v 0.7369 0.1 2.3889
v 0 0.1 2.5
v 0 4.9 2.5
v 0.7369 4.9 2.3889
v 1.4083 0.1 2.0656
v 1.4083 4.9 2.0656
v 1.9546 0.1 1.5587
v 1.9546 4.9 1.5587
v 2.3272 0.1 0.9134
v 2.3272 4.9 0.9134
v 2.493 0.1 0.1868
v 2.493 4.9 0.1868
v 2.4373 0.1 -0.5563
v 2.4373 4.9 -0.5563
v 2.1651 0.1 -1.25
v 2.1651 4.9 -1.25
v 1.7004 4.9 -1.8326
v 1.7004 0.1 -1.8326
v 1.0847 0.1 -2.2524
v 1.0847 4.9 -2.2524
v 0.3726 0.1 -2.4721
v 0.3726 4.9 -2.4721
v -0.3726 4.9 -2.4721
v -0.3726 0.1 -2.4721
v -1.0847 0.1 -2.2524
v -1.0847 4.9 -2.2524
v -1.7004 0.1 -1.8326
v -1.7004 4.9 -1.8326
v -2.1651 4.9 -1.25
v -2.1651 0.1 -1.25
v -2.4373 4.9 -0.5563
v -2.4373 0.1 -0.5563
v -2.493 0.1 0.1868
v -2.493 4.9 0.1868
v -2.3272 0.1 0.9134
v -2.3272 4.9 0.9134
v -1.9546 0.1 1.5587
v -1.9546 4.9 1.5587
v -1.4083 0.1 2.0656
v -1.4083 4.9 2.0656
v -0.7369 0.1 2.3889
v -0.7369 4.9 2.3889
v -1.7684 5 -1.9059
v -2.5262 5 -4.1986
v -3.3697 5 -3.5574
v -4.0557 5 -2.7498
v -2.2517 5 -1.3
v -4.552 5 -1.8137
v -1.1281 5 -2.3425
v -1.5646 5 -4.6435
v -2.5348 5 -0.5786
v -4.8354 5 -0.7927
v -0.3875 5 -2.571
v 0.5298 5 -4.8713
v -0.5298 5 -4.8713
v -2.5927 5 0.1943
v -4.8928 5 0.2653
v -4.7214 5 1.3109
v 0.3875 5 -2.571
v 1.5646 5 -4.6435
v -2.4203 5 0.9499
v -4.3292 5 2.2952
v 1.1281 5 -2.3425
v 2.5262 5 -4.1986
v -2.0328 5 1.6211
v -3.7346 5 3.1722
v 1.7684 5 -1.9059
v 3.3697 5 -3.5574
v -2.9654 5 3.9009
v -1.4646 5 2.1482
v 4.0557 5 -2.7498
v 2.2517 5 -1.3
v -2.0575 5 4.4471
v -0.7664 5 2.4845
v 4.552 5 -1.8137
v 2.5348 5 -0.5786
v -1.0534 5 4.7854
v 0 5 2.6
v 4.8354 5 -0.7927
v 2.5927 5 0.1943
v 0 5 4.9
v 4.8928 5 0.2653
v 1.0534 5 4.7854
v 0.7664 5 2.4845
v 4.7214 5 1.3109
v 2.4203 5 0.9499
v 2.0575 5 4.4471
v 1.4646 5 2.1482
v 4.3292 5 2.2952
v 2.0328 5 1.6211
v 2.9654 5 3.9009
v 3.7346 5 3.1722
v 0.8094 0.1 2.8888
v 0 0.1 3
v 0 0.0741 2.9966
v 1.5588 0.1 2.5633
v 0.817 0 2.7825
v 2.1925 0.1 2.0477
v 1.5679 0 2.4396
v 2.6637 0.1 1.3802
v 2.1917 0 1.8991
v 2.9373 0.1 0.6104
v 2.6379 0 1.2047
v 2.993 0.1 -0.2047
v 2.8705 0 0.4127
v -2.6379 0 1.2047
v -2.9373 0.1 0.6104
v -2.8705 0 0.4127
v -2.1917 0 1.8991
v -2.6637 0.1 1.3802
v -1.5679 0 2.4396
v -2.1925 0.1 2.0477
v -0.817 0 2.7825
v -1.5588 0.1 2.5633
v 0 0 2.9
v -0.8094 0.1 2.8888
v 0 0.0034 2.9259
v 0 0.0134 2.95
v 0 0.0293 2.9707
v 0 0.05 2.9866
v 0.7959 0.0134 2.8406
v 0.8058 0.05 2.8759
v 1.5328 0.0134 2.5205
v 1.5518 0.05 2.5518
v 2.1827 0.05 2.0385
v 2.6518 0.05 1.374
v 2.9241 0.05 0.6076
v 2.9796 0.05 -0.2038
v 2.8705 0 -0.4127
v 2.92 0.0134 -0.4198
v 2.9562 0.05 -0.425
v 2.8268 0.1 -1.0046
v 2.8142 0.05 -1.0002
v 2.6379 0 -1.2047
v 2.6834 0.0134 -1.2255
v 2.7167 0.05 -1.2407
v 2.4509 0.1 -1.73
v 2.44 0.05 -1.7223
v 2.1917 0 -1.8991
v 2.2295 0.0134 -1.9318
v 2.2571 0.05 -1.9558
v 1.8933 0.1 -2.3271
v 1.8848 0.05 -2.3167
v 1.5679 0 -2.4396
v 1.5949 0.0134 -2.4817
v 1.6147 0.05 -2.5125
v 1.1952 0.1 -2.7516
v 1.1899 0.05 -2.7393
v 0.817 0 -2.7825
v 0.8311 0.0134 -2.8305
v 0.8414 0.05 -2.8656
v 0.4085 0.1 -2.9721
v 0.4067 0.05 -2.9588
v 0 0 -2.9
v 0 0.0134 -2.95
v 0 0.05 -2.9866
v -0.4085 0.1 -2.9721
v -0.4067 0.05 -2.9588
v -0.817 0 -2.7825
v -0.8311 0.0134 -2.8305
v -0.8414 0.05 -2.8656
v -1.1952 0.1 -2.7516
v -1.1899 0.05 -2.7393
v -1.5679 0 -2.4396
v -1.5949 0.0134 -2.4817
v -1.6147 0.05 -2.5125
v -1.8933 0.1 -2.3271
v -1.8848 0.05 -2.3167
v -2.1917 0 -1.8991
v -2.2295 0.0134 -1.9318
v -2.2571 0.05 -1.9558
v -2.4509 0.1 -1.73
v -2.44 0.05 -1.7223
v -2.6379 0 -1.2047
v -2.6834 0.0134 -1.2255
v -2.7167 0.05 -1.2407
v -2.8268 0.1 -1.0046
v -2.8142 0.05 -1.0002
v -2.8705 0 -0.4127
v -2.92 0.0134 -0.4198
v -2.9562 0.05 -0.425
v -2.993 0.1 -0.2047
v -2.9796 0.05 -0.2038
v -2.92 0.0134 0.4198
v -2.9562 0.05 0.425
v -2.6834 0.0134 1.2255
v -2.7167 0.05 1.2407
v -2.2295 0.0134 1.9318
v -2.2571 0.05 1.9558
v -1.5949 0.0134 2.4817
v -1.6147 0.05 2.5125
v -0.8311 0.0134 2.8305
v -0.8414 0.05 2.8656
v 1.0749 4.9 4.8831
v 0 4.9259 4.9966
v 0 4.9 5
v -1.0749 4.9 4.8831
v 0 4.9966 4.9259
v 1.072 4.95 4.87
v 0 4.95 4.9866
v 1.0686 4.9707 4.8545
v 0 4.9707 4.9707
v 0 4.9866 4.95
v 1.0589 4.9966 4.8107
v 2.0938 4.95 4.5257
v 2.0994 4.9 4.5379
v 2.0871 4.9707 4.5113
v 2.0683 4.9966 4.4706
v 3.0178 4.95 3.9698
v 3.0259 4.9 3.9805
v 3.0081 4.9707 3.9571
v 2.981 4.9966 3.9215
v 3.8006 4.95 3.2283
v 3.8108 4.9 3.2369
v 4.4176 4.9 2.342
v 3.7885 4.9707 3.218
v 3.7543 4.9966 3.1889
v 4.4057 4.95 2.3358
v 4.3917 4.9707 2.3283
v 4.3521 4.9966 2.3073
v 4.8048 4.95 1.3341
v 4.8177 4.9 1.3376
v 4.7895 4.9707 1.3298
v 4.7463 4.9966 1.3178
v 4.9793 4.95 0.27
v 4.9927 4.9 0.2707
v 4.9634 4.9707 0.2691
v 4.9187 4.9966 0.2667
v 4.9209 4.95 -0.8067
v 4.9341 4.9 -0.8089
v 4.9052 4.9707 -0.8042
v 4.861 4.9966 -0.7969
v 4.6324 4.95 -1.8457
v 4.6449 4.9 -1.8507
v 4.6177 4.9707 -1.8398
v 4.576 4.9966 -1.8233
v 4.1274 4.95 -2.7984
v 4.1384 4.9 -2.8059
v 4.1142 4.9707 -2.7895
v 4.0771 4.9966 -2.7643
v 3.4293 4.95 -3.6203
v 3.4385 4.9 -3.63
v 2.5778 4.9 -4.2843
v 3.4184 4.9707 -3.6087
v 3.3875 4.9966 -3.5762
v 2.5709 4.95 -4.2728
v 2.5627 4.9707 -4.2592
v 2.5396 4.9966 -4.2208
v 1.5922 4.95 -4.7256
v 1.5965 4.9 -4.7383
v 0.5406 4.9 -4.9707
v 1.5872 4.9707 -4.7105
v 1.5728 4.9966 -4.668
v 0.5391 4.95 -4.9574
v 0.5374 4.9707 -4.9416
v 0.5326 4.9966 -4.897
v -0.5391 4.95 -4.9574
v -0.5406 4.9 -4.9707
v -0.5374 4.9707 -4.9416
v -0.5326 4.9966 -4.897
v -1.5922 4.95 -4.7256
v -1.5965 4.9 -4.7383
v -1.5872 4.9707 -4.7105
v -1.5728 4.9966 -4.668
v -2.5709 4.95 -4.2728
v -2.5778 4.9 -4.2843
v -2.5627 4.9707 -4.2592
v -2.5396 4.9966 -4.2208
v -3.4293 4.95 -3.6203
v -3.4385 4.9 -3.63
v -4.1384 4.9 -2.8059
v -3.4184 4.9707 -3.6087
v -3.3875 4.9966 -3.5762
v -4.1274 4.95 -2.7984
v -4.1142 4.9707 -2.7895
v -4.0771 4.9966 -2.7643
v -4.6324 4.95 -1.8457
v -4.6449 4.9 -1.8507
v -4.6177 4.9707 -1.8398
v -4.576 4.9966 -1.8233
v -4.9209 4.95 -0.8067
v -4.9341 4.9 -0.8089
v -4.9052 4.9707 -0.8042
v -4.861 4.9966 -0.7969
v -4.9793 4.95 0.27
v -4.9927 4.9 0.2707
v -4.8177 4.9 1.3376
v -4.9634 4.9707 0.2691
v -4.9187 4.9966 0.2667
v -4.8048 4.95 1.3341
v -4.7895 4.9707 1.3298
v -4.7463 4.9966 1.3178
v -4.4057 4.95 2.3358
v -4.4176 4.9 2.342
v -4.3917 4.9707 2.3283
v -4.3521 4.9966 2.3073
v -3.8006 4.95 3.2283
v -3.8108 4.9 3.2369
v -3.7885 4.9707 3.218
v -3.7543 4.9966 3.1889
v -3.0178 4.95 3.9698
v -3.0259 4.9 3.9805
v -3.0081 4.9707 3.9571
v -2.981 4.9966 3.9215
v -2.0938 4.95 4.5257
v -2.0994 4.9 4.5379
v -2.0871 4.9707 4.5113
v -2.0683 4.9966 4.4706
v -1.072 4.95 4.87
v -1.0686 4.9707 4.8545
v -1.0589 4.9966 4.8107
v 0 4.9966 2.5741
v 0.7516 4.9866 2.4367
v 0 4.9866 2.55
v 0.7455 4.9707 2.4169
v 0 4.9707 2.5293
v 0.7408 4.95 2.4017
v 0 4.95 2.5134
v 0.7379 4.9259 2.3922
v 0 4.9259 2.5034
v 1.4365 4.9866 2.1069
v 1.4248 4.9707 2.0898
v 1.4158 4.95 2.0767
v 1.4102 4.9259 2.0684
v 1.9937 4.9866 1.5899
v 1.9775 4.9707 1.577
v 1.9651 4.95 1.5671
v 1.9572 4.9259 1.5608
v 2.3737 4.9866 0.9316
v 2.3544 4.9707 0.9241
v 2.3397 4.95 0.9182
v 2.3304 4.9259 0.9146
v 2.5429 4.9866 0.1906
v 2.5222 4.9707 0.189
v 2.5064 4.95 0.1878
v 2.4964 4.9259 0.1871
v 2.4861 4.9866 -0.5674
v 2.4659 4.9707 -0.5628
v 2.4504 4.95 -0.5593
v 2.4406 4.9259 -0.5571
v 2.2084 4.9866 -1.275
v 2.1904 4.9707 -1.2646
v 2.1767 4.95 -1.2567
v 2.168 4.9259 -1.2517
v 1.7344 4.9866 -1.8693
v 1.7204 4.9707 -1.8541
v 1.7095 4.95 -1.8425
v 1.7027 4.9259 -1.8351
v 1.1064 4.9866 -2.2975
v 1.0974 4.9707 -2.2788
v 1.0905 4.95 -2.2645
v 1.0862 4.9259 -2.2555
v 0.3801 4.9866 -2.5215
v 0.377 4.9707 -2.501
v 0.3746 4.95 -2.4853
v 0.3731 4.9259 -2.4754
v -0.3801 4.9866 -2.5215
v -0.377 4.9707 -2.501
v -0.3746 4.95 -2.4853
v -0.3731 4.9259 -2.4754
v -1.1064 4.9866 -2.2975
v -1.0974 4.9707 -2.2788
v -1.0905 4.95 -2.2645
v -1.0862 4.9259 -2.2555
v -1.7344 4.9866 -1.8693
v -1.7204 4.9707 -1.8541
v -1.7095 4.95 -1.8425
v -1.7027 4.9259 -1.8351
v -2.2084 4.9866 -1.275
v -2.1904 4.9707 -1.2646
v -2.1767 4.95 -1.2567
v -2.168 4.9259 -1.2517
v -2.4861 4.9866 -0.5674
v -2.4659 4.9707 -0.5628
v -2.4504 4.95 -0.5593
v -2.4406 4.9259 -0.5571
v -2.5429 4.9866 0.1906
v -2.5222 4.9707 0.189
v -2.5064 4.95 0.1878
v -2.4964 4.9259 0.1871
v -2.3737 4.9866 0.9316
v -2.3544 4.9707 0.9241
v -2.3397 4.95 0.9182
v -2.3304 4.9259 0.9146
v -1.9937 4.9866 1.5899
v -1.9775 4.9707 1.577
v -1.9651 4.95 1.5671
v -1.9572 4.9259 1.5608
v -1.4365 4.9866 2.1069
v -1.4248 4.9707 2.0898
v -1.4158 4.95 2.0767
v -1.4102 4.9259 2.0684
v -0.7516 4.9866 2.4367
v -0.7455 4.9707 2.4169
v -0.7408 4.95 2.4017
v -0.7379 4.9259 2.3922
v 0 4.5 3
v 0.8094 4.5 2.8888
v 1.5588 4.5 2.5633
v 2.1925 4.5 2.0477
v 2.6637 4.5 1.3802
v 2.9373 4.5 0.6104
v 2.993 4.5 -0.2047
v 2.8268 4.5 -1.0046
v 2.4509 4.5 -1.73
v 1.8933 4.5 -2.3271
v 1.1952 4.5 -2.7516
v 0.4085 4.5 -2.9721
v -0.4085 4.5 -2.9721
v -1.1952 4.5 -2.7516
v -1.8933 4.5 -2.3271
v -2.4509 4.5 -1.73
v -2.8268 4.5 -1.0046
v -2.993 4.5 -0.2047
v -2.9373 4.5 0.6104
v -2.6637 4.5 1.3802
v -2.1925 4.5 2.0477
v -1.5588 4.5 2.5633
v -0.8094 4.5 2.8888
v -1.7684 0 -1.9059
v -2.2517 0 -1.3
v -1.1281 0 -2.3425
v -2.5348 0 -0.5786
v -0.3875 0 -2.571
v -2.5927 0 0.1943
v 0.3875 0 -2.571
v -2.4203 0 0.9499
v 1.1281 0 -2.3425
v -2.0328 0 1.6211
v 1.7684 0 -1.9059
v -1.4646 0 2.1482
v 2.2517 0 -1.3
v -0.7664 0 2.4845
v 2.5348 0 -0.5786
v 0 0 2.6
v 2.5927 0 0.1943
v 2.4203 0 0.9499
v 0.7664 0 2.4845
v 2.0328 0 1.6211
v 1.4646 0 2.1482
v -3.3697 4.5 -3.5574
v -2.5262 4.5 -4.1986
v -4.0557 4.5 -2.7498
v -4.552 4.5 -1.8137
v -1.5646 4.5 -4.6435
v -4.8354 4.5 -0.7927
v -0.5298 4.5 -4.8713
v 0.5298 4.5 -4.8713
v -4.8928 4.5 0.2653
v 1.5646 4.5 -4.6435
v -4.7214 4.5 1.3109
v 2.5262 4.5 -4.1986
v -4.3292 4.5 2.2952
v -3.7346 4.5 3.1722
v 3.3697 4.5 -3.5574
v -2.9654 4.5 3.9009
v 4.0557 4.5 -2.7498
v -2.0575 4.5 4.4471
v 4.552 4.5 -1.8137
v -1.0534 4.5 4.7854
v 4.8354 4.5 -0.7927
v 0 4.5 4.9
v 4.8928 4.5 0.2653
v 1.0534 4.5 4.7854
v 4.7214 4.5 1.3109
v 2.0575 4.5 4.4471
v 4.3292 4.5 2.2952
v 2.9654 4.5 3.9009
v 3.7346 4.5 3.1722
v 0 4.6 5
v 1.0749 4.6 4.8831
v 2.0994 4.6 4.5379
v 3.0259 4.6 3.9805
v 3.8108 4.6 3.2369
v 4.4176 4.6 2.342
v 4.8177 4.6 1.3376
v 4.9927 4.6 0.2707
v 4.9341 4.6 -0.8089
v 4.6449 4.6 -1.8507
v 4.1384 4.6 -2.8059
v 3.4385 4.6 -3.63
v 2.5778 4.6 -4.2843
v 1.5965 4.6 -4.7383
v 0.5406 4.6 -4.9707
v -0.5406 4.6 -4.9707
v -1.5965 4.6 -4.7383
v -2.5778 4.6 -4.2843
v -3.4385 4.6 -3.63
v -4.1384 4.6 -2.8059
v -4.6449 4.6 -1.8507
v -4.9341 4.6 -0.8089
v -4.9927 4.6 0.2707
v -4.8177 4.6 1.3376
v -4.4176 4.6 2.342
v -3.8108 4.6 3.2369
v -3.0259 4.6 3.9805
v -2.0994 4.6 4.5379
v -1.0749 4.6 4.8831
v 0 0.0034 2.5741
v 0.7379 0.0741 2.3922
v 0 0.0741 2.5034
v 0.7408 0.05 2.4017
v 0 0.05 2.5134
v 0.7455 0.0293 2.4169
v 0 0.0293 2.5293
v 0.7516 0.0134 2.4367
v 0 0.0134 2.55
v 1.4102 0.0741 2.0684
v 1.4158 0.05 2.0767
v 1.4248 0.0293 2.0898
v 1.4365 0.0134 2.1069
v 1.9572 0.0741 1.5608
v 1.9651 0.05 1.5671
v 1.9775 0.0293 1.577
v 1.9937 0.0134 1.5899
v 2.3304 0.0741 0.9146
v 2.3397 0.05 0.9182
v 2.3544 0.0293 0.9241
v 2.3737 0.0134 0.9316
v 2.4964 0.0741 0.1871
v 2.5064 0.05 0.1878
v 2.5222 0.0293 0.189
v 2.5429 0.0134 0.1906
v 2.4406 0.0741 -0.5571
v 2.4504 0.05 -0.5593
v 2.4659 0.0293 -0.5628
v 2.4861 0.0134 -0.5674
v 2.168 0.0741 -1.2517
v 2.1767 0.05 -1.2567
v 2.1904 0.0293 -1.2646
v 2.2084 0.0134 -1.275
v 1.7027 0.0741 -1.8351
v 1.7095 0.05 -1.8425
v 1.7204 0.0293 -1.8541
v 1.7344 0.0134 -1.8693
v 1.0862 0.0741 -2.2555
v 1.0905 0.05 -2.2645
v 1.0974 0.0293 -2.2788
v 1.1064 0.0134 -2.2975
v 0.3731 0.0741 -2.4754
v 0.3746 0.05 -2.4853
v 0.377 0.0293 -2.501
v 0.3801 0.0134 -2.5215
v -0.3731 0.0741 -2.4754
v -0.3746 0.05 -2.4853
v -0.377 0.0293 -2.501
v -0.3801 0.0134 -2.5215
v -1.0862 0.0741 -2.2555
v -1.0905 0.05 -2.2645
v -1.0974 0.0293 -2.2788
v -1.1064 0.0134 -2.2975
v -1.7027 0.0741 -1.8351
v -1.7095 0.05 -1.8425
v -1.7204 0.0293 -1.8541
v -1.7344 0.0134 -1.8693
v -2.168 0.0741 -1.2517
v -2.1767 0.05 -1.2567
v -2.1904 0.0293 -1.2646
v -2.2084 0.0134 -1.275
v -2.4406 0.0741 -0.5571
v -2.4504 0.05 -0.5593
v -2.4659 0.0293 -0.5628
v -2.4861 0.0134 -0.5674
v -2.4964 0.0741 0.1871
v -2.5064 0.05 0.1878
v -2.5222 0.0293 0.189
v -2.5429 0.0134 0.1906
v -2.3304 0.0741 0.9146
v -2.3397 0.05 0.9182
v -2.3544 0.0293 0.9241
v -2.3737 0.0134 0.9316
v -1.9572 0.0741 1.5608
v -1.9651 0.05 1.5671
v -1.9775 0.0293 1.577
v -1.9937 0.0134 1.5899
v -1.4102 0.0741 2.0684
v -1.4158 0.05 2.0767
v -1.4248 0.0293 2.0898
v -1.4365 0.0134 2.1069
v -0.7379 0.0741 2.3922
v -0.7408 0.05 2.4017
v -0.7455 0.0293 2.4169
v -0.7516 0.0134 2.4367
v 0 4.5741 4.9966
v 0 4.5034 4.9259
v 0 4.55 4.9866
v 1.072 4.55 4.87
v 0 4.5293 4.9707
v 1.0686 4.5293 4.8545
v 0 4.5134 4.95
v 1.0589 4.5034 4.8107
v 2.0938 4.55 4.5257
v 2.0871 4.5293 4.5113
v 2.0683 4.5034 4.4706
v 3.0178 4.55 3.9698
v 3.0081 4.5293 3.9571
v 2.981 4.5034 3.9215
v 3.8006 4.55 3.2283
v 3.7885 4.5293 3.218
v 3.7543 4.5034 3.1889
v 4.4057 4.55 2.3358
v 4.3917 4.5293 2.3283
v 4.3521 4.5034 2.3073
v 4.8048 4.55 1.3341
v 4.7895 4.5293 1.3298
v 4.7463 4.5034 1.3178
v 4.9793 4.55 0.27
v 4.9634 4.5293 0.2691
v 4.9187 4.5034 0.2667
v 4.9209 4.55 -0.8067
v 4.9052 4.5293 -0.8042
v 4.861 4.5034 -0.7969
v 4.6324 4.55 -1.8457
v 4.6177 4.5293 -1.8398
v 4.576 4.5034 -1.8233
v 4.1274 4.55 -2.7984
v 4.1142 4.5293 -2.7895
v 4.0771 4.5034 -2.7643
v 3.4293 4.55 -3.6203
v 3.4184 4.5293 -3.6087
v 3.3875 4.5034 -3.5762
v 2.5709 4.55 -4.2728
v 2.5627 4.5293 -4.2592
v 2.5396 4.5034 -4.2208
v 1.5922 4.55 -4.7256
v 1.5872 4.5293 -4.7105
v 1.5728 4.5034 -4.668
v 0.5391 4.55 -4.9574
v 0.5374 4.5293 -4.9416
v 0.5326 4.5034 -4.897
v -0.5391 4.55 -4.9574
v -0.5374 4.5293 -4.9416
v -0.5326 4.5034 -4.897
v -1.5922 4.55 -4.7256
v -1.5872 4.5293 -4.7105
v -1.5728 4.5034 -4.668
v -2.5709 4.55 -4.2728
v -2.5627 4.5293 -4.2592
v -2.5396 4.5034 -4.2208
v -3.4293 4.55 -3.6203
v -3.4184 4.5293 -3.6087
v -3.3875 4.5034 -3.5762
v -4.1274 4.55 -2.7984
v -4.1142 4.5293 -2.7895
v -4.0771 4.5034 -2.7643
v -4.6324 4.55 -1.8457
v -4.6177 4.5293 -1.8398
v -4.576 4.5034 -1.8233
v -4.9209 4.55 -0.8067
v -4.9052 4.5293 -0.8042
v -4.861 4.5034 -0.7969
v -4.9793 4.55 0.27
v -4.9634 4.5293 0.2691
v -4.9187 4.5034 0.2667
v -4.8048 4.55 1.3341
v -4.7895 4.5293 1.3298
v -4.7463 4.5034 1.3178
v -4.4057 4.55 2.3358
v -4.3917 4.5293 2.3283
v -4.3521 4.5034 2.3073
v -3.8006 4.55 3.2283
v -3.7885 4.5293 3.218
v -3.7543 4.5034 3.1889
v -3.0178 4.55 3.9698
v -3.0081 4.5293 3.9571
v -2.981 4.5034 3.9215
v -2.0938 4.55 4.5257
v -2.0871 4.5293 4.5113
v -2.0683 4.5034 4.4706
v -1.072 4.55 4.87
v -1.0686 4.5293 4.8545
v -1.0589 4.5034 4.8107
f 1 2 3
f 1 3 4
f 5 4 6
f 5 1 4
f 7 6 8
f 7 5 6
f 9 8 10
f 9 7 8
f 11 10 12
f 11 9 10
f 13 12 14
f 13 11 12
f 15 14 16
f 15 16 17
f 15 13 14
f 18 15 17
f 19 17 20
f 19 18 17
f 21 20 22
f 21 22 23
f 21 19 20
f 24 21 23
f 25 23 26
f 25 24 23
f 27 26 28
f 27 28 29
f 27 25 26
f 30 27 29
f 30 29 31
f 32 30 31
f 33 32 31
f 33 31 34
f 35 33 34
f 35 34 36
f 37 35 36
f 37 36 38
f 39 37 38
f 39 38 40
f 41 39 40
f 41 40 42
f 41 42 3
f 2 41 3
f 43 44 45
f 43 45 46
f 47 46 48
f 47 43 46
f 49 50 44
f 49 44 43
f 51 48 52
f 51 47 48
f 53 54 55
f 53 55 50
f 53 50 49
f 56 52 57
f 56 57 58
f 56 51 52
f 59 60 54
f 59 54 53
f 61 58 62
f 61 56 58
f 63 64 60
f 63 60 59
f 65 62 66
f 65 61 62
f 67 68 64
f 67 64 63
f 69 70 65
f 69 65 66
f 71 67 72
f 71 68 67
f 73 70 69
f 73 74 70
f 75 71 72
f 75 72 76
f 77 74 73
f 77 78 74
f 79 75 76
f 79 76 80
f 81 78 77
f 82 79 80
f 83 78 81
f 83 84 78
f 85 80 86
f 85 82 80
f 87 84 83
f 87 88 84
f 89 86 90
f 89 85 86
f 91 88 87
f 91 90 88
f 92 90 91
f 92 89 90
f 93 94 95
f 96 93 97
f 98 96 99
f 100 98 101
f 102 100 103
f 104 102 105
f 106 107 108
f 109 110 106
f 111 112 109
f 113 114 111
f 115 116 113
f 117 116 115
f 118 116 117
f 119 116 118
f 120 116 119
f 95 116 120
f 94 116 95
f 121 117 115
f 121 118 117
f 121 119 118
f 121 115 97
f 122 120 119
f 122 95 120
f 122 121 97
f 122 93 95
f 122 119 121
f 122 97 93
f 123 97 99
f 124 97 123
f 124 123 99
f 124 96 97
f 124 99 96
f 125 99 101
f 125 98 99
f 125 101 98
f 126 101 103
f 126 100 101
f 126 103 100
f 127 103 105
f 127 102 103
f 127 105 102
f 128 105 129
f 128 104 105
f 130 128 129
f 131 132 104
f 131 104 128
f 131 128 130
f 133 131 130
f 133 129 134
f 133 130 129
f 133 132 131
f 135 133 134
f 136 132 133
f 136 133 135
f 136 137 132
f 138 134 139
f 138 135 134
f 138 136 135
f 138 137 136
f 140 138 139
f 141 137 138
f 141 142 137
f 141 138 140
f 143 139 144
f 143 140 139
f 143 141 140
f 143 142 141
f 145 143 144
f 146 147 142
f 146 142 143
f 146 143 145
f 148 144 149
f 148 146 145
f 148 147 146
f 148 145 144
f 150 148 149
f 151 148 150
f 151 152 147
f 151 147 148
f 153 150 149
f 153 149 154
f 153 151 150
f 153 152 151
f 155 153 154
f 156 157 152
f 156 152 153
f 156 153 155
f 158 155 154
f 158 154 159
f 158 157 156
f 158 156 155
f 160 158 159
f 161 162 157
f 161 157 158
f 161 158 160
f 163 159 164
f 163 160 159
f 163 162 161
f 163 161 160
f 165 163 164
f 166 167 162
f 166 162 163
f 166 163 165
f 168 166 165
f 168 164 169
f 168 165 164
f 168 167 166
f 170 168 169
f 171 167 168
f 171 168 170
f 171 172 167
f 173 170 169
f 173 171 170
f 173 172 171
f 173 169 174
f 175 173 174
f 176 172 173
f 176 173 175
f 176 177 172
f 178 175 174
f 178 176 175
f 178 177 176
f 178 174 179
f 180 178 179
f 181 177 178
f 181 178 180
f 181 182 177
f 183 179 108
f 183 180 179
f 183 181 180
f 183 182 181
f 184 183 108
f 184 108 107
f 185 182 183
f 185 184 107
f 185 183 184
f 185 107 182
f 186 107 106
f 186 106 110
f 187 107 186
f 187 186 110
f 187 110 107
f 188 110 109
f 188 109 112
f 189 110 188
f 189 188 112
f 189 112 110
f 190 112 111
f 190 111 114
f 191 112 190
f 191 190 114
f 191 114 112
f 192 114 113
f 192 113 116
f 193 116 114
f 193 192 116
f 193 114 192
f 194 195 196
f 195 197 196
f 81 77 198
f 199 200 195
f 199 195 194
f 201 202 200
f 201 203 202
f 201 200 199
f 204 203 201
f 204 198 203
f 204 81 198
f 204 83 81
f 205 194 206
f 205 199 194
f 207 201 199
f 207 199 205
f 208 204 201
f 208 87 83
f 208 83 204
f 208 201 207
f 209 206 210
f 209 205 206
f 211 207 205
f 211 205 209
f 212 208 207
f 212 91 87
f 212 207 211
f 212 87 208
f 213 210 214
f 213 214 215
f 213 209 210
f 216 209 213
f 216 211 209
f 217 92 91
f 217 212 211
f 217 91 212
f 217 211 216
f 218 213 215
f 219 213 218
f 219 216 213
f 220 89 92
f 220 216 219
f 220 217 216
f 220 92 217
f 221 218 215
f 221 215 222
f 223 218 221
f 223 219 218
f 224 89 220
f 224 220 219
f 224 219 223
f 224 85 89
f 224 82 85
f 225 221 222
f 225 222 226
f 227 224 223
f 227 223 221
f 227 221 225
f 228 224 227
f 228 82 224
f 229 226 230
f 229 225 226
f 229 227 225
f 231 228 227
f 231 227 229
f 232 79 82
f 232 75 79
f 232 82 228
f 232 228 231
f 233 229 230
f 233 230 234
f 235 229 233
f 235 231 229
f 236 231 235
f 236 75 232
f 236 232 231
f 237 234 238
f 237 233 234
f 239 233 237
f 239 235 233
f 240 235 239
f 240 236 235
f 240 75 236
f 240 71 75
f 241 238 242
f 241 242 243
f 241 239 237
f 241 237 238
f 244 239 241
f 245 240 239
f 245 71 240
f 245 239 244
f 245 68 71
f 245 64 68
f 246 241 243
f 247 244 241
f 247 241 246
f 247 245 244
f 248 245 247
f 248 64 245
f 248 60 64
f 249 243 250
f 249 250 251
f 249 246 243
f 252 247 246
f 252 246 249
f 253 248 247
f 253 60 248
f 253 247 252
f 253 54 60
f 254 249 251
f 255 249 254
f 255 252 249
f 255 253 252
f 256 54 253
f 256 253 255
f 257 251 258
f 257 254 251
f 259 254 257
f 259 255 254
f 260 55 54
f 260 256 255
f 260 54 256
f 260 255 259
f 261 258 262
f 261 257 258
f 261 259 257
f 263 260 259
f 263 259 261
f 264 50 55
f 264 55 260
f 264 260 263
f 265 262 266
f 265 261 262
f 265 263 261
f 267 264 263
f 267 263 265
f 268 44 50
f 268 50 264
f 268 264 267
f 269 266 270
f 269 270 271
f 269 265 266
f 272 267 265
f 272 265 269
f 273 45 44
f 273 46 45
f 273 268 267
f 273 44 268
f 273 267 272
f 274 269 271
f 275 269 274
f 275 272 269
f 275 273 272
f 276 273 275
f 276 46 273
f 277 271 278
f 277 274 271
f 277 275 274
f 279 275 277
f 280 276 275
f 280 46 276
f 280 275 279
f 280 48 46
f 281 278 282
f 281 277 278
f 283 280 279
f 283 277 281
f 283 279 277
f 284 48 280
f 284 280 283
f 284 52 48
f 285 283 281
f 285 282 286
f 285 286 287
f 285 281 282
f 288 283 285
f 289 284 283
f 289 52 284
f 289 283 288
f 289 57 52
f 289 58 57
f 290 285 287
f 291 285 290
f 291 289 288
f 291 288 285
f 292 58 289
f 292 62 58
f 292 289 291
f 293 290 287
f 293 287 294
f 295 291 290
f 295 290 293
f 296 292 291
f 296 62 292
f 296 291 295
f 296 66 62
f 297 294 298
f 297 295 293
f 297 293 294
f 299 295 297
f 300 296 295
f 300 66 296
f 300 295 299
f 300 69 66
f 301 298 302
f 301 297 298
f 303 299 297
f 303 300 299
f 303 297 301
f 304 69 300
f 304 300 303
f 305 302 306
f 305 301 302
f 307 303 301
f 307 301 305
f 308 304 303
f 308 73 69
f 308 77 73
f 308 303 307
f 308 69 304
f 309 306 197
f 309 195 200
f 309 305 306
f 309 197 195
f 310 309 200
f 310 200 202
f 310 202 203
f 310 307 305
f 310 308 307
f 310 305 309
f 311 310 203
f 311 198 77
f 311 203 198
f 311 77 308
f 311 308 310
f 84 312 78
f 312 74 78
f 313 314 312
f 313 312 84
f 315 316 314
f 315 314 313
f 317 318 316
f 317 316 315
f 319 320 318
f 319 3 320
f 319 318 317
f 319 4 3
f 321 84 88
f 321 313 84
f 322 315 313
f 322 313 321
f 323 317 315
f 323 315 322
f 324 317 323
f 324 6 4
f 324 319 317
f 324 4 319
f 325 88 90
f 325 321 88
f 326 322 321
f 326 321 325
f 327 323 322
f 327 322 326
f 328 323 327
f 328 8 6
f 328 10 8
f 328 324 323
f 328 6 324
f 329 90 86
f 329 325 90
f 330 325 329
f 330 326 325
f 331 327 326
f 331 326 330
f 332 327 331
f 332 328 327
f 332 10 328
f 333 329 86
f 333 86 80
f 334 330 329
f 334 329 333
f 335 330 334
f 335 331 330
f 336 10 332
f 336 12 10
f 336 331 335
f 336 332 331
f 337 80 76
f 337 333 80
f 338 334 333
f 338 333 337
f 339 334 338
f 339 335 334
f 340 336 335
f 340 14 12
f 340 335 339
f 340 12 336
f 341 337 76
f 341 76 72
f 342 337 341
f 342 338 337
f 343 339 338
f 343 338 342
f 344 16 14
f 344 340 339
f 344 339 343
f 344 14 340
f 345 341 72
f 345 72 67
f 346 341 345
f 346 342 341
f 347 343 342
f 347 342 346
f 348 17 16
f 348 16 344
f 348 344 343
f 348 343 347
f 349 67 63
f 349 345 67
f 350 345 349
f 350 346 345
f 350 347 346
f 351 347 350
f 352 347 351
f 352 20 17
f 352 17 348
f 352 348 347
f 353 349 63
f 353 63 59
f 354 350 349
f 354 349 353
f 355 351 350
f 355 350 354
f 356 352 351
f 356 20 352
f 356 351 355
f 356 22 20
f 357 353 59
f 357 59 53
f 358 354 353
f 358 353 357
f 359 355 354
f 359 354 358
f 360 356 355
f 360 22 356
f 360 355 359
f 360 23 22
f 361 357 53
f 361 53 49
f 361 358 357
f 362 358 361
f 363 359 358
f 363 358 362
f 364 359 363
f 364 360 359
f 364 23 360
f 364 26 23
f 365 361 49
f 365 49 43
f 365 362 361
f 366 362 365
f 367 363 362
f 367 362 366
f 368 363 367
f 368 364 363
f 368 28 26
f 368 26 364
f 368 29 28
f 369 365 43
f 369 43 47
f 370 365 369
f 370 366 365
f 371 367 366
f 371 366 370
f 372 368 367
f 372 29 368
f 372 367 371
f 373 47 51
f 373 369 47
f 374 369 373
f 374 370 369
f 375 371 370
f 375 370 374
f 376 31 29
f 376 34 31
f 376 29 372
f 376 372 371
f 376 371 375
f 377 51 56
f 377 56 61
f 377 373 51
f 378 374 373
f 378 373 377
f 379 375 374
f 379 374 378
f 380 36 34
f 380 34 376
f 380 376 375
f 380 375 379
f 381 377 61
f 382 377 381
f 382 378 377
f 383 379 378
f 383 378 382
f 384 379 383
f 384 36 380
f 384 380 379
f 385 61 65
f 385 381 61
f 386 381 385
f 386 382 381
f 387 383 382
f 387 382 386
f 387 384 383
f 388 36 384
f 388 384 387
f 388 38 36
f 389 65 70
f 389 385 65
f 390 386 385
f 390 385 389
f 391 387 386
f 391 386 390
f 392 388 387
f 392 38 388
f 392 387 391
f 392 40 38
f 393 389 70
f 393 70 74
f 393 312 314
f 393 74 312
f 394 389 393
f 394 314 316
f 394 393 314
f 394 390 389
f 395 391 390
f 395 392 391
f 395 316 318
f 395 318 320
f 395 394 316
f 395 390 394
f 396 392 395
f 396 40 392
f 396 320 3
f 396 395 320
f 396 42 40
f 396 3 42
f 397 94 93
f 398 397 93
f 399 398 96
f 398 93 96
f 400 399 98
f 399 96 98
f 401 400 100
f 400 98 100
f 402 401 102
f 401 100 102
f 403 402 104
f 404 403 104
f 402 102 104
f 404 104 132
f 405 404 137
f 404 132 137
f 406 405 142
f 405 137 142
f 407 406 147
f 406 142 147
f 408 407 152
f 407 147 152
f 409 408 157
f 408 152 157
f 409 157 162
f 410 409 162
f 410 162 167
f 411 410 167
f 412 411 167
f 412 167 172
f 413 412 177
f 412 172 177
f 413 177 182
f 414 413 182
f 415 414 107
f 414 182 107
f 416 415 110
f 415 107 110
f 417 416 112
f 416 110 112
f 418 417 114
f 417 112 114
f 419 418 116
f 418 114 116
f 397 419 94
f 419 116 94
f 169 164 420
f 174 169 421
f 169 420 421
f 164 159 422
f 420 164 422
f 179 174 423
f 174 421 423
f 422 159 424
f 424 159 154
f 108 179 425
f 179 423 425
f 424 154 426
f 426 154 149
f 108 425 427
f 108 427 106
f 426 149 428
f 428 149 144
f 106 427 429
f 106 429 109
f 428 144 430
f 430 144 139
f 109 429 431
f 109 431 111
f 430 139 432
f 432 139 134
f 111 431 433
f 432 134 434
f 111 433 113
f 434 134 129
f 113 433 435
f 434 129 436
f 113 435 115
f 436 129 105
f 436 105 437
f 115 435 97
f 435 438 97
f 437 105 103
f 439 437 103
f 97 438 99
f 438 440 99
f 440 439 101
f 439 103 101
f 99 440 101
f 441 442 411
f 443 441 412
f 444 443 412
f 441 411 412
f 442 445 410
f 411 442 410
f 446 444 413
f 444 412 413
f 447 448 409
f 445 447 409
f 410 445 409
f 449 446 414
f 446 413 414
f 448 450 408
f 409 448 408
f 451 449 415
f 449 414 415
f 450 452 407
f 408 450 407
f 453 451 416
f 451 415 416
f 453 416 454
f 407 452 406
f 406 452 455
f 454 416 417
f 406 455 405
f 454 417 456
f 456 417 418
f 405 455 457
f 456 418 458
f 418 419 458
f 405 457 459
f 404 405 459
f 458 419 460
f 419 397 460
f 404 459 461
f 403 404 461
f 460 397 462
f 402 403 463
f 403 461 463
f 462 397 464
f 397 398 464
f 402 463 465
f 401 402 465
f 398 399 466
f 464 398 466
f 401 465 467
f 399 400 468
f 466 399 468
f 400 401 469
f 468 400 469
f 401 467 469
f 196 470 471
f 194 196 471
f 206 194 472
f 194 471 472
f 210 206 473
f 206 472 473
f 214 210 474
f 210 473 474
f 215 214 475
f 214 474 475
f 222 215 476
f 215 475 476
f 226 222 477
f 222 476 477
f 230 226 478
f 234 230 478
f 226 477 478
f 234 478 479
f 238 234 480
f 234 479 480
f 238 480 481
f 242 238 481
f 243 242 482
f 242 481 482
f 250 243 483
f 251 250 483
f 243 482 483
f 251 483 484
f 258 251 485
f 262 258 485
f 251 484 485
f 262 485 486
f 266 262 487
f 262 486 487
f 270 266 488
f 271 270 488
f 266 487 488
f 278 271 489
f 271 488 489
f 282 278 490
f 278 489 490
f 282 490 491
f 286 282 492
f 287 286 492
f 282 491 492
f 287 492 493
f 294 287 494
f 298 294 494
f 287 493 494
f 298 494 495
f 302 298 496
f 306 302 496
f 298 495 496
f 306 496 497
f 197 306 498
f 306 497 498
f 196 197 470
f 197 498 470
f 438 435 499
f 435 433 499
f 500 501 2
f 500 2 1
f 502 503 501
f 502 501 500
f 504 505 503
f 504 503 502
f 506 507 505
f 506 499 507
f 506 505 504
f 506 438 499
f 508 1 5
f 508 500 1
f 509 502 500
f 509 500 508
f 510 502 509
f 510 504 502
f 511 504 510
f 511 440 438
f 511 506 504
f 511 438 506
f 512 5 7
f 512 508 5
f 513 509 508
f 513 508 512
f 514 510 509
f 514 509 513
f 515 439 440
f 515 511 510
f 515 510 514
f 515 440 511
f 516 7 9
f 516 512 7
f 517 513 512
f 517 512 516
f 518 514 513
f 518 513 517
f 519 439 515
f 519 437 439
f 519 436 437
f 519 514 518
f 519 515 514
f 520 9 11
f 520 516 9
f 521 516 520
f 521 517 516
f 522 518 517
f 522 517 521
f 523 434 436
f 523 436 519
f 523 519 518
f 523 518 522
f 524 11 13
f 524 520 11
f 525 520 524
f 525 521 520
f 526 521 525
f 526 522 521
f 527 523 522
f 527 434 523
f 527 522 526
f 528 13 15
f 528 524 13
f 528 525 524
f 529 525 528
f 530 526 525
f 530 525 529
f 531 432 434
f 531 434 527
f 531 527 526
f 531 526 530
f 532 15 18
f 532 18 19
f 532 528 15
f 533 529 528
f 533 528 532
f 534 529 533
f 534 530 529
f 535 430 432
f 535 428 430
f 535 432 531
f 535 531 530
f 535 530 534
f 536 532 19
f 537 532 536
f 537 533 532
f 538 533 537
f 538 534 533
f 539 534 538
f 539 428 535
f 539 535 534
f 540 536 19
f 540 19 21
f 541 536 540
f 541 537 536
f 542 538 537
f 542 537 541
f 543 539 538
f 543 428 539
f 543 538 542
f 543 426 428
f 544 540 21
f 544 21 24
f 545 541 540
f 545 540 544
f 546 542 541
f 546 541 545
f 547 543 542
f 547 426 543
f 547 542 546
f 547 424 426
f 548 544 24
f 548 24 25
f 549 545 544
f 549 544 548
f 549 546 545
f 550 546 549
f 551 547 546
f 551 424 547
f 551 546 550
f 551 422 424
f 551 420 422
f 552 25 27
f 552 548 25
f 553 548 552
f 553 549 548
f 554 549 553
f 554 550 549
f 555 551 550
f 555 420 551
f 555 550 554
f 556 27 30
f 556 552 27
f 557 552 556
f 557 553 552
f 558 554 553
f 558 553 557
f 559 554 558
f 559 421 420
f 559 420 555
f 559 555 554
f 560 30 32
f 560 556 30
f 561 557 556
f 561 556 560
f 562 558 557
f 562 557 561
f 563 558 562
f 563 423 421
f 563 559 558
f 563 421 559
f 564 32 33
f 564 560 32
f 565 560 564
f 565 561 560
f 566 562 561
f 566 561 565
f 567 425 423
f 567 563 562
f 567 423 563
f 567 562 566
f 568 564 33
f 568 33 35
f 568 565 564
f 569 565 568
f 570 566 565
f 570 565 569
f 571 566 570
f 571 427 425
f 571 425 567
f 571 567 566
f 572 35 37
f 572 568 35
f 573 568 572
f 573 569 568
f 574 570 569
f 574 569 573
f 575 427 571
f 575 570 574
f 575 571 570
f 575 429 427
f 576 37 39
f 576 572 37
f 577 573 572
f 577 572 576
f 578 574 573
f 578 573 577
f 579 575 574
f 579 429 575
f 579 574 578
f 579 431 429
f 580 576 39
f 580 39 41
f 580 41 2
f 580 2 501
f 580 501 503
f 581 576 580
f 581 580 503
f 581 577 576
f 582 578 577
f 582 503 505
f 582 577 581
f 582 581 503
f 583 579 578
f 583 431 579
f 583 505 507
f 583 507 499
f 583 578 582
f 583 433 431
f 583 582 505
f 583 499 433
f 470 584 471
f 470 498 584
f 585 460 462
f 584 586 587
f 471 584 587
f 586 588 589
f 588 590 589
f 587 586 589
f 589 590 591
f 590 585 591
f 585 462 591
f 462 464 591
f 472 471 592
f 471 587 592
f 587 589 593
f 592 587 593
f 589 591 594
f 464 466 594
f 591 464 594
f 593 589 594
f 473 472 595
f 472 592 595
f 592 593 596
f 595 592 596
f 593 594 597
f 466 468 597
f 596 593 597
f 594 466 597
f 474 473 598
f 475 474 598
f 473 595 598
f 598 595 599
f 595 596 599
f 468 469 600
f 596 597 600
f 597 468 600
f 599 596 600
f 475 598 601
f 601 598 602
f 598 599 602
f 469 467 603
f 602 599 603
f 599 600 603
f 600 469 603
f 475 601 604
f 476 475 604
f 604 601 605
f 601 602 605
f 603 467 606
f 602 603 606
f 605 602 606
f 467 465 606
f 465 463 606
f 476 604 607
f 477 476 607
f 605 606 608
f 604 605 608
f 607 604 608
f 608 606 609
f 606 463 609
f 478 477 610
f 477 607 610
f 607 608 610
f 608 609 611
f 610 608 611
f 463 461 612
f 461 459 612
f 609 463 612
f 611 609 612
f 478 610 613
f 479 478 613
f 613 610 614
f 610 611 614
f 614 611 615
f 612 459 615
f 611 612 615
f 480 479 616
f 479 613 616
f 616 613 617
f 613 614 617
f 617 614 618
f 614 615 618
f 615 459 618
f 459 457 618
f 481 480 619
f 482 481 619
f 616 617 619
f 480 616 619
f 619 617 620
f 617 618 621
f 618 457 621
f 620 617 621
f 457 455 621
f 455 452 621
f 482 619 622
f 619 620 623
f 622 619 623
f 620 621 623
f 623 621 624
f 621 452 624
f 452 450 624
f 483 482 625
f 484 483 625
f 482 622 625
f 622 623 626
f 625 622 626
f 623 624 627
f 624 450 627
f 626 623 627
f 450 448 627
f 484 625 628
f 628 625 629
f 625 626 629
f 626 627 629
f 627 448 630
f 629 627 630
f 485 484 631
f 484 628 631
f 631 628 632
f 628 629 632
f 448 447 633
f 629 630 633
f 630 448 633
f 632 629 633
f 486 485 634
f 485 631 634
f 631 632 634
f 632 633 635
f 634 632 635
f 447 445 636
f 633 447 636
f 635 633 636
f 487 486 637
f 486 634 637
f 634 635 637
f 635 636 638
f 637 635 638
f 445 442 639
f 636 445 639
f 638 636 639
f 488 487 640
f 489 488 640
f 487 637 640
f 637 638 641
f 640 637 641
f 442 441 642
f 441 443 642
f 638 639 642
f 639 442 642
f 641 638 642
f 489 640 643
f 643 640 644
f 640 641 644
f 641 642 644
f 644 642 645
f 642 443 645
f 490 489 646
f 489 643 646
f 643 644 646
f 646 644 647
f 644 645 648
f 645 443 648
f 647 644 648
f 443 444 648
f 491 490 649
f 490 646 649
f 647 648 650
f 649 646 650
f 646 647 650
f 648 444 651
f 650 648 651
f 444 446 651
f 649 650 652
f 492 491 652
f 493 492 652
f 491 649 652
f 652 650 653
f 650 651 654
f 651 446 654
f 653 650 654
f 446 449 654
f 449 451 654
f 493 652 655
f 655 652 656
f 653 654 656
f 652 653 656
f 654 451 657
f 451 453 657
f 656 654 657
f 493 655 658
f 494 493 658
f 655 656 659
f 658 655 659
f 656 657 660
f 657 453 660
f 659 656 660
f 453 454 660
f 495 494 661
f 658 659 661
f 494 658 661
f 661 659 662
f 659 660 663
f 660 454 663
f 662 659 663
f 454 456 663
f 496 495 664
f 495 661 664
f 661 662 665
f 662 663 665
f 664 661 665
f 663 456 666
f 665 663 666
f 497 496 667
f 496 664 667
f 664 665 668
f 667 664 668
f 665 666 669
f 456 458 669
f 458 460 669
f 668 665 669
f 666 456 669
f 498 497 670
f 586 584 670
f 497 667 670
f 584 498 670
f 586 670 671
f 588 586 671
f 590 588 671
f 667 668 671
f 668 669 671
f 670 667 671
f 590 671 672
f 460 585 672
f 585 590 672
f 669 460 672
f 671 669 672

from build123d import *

# Parameters (mm, degrees)
SKETCH1_R           = 3
SKETCH1_R_2         = 2.5
BOSS_EXTRUDE1_DEPTH = 4.5
SKETCH2_R           = 5
SKETCH2_R_2         = 2.5
BOSS_EXTRUDE2_DEPTH = 0.5
FILLET1_R           = 0.1


with BuildPart() as part:
    # Sketch1 → Boss-Extrude1 (new body)
    with BuildSketch(Plane(origin=(0, 0, 0), x_dir=(1, 0, 0), z_dir=(0, 1, 0))):
        with Locations(Location((0, 0, 0), (0, 0, 270))):
            Circle(SKETCH1_R)
        with Locations(Location((0, 0, 0), (0, 0, 270))):
            Circle(SKETCH1_R_2, mode=Mode.SUBTRACT)
    extrude(amount=BOSS_EXTRUDE1_DEPTH)

    # Sketch2 → Boss-Extrude2 (add)
    with BuildSketch(Plane(origin=(0, 4.5, 0), x_dir=(1, 0, 0), z_dir=(0, 1, 0))):
        with Locations(Location((0, 0, 0), (0, 0, 270))):
            Circle(SKETCH2_R)
        with Locations(Location((0, 0, 0), (0, 0, 270))):
            Circle(SKETCH2_R_2, mode=Mode.SUBTRACT)
    extrude(amount=BOSS_EXTRUDE2_DEPTH)

    # Fillet1
    fillet1_edges = [part.edges().sort_by_distance(p)[0] for p in [
        (0, 4.5, -5),
        (0, 5, -2.5),
        (0, 0, -3),
        (0, 0, -2.5),
        (0, 5, -5),
    ]]
    fillet(fillet1_edges, radius=FILLET1_R)


solid = part.part
